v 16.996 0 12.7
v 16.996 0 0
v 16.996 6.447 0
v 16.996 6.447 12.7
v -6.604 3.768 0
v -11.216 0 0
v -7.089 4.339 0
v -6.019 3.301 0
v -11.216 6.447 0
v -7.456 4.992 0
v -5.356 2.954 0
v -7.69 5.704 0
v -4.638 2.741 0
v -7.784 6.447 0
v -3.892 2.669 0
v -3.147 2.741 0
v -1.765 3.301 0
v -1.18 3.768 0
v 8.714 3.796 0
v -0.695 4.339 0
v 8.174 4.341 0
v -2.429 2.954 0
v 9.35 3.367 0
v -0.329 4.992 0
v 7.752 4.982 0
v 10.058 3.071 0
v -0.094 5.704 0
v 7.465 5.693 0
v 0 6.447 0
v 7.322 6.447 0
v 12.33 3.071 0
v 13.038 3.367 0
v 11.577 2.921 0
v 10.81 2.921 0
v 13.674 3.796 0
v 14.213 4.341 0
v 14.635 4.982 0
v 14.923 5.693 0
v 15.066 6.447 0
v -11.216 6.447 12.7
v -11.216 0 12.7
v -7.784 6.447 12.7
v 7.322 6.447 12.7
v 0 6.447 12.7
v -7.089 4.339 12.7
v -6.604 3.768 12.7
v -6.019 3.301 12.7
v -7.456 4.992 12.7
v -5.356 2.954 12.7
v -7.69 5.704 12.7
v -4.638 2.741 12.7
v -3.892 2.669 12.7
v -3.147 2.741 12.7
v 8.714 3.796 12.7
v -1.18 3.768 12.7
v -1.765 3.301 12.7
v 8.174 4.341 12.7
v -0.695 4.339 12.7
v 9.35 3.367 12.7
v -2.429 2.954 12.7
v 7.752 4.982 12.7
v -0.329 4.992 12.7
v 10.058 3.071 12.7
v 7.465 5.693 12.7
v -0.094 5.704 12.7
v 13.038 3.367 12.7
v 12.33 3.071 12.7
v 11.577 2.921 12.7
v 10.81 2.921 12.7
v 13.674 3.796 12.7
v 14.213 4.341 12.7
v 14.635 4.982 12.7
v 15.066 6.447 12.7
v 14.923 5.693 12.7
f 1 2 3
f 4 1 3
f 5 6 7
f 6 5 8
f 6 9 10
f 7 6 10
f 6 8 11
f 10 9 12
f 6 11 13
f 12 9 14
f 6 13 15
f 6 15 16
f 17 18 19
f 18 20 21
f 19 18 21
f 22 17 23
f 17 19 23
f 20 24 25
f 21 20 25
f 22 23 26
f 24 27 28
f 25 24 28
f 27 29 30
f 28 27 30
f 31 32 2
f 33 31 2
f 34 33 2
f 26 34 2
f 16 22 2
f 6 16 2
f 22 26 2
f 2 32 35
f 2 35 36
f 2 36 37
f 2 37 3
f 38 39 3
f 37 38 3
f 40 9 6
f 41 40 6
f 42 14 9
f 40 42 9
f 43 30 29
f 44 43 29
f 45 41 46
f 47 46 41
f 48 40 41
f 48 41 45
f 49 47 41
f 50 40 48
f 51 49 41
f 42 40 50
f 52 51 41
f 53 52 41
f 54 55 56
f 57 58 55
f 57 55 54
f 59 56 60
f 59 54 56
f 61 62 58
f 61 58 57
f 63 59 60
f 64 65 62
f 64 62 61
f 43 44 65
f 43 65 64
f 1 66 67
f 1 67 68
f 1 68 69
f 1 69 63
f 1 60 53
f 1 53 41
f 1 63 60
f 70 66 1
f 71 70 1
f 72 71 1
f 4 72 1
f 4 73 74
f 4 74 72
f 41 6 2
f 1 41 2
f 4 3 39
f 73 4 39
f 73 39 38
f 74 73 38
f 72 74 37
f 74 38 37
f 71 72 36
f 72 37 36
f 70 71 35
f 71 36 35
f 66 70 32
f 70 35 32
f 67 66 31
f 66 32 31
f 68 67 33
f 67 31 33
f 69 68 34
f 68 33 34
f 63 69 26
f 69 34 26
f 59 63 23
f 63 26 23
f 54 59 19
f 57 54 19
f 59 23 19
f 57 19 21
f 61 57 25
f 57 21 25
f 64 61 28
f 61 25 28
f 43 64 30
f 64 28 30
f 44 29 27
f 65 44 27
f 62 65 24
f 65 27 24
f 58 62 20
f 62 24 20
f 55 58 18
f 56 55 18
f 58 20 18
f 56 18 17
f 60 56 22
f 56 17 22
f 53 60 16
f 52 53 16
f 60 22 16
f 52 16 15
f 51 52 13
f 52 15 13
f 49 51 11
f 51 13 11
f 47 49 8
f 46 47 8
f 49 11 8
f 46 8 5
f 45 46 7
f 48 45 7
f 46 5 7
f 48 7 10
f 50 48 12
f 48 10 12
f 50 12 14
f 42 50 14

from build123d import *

# Parameters (mm, degrees)
F1_DEPTH = 12.7


with BuildPart() as f1:
    # F0 (on Top) → F1 (new body)
    with BuildSketch(Plane.XY):
        with BuildLine():
            Line((-11.216301, 6.446693), (-11.216301, 0))
            Line((-11.216301, 0), (16.996317, 0))
            Line((16.996317, 0), (16.996317, 6.446693))
            Line((16.996317, 6.446693), (15.065662, 6.446693))
            ThreePointArc((15.065662, 6.446693), (11.193809, 2.90156), (7.321957, 6.446693))
            Line((7.321957, 6.446693), (0, 6.446693))
            ThreePointArc((0, 6.446693), (-3.892248, 2.668559), (-7.784497, 6.446693))
            Line((-7.784497, 6.446693), (-11.216301, 6.446693))
        make_face()
    extrude(amount=F1_DEPTH)


solid = f1.part
